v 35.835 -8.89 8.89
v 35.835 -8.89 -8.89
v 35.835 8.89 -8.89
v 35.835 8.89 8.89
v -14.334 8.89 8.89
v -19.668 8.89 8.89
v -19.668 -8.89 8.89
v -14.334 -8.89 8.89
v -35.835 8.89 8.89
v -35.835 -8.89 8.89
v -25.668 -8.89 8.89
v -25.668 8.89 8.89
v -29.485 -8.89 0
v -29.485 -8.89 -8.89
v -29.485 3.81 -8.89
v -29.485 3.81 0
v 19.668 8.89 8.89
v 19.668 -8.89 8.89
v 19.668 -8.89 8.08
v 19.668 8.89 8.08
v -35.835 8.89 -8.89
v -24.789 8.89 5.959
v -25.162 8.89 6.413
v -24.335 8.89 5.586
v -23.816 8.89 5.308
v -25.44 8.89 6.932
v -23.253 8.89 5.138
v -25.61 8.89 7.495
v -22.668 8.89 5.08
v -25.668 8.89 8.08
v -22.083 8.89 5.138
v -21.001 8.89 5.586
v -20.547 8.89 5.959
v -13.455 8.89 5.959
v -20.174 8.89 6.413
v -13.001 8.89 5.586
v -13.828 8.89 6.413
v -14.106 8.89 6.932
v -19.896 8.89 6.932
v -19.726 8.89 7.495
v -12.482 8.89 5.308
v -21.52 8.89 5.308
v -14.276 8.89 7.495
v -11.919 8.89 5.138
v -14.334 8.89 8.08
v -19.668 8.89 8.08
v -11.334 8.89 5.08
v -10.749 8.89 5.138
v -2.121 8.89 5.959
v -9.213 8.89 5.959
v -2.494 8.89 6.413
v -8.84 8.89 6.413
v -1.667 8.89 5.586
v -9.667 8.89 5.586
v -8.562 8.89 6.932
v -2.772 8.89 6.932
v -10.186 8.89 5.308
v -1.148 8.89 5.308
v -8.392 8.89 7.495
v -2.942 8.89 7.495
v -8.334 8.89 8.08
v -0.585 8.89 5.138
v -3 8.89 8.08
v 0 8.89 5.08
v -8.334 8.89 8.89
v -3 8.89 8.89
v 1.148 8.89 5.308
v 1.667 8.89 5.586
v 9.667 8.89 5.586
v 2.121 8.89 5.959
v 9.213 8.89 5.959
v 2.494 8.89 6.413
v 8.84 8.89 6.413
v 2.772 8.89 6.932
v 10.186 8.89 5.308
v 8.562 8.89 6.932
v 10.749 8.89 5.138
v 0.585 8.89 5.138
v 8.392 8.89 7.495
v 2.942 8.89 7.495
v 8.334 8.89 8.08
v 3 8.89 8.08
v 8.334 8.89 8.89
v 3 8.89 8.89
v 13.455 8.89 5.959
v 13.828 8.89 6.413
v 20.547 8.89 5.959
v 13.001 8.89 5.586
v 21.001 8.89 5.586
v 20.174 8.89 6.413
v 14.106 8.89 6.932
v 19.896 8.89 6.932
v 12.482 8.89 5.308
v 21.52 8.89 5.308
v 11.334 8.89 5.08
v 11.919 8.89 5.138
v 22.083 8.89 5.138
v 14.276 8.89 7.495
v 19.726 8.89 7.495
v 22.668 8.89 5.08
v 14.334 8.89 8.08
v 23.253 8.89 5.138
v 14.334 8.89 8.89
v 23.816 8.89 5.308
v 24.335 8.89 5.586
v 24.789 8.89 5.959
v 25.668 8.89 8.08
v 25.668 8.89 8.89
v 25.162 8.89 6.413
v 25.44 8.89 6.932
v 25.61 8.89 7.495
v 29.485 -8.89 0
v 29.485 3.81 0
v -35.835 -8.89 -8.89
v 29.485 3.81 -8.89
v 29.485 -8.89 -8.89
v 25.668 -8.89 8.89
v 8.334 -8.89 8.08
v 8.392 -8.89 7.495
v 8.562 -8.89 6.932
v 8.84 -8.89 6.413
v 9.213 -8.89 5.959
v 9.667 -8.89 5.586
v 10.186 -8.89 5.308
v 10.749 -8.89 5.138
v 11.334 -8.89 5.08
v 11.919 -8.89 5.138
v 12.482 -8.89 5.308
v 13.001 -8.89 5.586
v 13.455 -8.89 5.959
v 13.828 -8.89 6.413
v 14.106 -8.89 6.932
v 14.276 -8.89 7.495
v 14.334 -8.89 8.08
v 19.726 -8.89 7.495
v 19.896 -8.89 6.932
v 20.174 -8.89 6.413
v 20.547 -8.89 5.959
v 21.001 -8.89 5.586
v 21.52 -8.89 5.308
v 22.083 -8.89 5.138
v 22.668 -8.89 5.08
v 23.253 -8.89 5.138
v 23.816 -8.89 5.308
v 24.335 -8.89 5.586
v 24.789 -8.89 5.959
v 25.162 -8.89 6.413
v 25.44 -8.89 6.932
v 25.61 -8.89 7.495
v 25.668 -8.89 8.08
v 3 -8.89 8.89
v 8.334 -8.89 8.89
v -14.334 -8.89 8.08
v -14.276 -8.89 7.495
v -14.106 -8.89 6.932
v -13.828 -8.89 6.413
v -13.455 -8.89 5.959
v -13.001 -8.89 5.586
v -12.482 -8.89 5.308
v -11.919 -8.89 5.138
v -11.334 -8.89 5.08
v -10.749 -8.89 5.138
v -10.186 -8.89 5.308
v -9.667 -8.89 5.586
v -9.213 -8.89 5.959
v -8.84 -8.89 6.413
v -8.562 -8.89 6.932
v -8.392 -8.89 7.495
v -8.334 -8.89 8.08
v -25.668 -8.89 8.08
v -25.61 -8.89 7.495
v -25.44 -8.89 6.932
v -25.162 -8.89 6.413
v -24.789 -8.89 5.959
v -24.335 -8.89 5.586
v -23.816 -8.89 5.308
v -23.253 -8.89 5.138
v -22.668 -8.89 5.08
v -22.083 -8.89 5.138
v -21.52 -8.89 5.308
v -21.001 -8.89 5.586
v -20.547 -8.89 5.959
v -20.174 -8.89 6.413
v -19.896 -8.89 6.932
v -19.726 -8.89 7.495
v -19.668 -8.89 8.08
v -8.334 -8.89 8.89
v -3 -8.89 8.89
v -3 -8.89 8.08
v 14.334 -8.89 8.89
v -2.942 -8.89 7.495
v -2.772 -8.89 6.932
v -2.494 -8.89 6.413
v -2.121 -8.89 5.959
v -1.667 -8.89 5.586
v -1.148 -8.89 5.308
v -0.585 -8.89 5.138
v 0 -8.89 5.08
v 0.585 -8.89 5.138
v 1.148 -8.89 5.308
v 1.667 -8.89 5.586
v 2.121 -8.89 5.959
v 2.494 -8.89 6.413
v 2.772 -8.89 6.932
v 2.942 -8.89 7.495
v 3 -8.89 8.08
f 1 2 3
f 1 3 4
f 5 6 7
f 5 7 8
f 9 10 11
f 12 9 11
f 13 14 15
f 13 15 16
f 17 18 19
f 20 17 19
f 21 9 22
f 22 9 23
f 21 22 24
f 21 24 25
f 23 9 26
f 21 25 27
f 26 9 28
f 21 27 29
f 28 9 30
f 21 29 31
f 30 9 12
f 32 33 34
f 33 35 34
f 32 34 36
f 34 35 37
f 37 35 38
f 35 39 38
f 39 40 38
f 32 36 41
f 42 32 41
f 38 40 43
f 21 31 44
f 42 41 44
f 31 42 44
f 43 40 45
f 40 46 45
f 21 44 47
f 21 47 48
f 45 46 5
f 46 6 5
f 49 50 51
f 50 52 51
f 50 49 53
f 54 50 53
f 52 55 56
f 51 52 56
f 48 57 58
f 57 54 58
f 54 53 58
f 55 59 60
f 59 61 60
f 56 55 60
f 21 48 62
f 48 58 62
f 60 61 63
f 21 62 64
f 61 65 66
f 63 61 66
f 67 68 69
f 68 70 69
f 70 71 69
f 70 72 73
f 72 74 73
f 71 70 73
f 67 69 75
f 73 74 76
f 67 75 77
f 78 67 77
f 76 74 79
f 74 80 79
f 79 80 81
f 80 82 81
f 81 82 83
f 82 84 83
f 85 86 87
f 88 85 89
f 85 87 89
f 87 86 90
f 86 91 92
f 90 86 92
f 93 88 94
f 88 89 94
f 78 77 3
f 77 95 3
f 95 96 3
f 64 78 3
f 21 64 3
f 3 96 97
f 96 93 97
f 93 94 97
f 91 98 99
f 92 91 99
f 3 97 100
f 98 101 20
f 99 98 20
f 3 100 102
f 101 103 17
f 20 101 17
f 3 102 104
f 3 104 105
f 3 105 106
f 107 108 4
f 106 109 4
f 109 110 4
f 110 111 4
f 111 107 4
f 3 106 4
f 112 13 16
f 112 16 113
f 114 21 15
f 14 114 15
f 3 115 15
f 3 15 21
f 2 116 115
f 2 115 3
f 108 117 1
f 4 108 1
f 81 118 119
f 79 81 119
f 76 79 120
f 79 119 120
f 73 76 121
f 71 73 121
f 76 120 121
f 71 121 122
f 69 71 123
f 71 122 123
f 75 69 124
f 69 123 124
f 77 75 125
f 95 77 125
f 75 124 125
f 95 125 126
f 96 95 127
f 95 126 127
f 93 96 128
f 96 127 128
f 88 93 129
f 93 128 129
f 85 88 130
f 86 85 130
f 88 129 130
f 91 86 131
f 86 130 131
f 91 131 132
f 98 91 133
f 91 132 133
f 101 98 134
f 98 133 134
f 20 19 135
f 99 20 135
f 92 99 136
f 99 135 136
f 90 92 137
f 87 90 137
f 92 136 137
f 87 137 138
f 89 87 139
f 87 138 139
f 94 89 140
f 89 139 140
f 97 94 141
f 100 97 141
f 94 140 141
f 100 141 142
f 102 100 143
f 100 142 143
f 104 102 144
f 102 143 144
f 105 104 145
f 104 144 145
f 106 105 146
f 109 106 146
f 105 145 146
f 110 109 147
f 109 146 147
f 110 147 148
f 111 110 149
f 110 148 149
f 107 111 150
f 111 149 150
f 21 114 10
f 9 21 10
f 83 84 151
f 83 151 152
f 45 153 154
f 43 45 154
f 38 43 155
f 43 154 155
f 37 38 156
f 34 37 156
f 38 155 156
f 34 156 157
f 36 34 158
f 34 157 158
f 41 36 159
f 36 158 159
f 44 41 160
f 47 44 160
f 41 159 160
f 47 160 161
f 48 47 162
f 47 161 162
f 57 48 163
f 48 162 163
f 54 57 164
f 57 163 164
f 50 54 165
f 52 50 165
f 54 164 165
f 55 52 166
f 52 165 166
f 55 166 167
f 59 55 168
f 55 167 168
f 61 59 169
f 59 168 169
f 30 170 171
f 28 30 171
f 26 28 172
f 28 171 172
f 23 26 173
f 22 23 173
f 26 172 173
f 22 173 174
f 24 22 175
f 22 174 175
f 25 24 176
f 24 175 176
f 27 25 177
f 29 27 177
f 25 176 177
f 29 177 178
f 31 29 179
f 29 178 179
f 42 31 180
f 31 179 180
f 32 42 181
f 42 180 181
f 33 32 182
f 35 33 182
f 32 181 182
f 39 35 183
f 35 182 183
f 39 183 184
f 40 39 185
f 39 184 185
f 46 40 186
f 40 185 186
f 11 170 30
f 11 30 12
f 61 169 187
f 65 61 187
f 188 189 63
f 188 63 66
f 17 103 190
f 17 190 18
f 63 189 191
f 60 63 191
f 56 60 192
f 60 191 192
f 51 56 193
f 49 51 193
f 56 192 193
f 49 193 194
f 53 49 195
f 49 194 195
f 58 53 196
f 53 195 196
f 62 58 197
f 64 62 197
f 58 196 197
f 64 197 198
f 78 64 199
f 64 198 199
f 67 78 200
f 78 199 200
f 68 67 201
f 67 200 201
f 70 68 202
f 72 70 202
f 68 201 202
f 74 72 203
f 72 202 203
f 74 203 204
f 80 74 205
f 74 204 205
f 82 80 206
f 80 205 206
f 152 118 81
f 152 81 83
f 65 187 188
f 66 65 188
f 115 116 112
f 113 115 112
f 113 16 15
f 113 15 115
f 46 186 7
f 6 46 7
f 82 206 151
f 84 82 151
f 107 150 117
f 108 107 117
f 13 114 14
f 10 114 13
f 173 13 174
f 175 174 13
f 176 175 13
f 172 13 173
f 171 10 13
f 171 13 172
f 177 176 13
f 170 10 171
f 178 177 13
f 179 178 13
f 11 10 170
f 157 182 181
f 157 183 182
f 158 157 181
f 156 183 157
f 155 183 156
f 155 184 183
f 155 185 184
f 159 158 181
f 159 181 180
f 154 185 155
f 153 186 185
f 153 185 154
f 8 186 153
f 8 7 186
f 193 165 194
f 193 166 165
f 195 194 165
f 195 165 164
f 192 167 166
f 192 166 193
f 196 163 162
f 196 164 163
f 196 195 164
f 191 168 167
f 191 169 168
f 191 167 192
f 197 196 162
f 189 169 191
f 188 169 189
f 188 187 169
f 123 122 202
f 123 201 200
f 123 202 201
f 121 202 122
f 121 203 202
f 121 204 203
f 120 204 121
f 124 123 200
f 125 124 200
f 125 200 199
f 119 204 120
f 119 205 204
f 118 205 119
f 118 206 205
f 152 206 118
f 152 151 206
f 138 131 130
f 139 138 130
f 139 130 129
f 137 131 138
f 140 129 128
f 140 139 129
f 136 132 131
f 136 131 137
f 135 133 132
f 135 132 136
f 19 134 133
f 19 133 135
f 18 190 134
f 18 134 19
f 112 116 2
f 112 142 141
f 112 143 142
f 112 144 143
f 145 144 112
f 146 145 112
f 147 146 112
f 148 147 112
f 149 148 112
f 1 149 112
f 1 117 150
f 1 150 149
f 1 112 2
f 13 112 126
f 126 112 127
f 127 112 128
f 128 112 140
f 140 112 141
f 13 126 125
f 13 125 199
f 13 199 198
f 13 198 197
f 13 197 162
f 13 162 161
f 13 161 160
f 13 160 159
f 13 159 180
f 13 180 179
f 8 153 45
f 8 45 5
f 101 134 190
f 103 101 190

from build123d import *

# Parameters (mm, degrees)
F0_W     = 71.67
F0_H     = 17.78
F1_DEPTH = 8.89
F2_W     = 6
F2_H     = 0.81
F3_DEPTH = 17.781
F4_W     = 58.97
F4_H     = 8.89
F5_DEPTH = 12.7


with BuildPart() as f1:
    # F0 (on Front) → F1 (new body, symmetric)
    with BuildSketch(Plane.XZ):
        Rectangle(F0_W, F0_H)
    extrude(amount=F1_DEPTH, both=True)

    # F2 (on face) → F3 (cut, through all)
    with BuildSketch(Plane.XZ.offset(8.89)):
        with Locations((-22.668, 8.485)):
            Rectangle(F2_W, F2_H)
        with BuildLine():
            Line((-19.668, 8.08), (-25.668, 8.08))
            ThreePointArc((-25.668, 8.08), (-22.668, 5.08), (-19.668, 8.08))
        make_face()
        with Locations((-11.334, 8.485)):
            Rectangle(F2_W, F2_H)
        with BuildLine():
            ThreePointArc((-14.334, 8.08), (-11.334, 5.08), (-8.334, 8.08))
            Line((-8.334, 8.08), (-14.334, 8.08))
        make_face()
        with Locations((0, 8.485)):
            Rectangle(F2_W, F2_H)
        with BuildLine():
            ThreePointArc((-3, 8.08), (0, 5.08), (3, 8.08))
            Line((3, 8.08), (-3, 8.08))
        make_face()
        with Locations((11.334, 8.485)):
            Rectangle(F2_W, F2_H)
        with BuildLine():
            ThreePointArc((8.334, 8.08), (11.334, 5.08), (14.334, 8.08))
            Line((14.334, 8.08), (8.334, 8.08))
        make_face()
        with BuildLine():
            Line((25.668, 8.08), (25.668, 8.89))
            Line((25.668, 8.89), (19.668, 8.89))
            Line((19.668, 8.89), (19.668, 8.08))
            ThreePointArc((19.668, 8.08), (22.668, 5.08), (25.668, 8.08))
        make_face()
    extrude(amount=-F3_DEPTH, mode=Mode.SUBTRACT)

    # F4 (on face) → F5 (cut)
    with BuildSketch(Plane.XZ.offset(8.89)):
        with Locations((0, -4.445)):
            Rectangle(F4_W, F4_H)
    extrude(amount=-F5_DEPTH, mode=Mode.SUBTRACT)


solid = f1.part
